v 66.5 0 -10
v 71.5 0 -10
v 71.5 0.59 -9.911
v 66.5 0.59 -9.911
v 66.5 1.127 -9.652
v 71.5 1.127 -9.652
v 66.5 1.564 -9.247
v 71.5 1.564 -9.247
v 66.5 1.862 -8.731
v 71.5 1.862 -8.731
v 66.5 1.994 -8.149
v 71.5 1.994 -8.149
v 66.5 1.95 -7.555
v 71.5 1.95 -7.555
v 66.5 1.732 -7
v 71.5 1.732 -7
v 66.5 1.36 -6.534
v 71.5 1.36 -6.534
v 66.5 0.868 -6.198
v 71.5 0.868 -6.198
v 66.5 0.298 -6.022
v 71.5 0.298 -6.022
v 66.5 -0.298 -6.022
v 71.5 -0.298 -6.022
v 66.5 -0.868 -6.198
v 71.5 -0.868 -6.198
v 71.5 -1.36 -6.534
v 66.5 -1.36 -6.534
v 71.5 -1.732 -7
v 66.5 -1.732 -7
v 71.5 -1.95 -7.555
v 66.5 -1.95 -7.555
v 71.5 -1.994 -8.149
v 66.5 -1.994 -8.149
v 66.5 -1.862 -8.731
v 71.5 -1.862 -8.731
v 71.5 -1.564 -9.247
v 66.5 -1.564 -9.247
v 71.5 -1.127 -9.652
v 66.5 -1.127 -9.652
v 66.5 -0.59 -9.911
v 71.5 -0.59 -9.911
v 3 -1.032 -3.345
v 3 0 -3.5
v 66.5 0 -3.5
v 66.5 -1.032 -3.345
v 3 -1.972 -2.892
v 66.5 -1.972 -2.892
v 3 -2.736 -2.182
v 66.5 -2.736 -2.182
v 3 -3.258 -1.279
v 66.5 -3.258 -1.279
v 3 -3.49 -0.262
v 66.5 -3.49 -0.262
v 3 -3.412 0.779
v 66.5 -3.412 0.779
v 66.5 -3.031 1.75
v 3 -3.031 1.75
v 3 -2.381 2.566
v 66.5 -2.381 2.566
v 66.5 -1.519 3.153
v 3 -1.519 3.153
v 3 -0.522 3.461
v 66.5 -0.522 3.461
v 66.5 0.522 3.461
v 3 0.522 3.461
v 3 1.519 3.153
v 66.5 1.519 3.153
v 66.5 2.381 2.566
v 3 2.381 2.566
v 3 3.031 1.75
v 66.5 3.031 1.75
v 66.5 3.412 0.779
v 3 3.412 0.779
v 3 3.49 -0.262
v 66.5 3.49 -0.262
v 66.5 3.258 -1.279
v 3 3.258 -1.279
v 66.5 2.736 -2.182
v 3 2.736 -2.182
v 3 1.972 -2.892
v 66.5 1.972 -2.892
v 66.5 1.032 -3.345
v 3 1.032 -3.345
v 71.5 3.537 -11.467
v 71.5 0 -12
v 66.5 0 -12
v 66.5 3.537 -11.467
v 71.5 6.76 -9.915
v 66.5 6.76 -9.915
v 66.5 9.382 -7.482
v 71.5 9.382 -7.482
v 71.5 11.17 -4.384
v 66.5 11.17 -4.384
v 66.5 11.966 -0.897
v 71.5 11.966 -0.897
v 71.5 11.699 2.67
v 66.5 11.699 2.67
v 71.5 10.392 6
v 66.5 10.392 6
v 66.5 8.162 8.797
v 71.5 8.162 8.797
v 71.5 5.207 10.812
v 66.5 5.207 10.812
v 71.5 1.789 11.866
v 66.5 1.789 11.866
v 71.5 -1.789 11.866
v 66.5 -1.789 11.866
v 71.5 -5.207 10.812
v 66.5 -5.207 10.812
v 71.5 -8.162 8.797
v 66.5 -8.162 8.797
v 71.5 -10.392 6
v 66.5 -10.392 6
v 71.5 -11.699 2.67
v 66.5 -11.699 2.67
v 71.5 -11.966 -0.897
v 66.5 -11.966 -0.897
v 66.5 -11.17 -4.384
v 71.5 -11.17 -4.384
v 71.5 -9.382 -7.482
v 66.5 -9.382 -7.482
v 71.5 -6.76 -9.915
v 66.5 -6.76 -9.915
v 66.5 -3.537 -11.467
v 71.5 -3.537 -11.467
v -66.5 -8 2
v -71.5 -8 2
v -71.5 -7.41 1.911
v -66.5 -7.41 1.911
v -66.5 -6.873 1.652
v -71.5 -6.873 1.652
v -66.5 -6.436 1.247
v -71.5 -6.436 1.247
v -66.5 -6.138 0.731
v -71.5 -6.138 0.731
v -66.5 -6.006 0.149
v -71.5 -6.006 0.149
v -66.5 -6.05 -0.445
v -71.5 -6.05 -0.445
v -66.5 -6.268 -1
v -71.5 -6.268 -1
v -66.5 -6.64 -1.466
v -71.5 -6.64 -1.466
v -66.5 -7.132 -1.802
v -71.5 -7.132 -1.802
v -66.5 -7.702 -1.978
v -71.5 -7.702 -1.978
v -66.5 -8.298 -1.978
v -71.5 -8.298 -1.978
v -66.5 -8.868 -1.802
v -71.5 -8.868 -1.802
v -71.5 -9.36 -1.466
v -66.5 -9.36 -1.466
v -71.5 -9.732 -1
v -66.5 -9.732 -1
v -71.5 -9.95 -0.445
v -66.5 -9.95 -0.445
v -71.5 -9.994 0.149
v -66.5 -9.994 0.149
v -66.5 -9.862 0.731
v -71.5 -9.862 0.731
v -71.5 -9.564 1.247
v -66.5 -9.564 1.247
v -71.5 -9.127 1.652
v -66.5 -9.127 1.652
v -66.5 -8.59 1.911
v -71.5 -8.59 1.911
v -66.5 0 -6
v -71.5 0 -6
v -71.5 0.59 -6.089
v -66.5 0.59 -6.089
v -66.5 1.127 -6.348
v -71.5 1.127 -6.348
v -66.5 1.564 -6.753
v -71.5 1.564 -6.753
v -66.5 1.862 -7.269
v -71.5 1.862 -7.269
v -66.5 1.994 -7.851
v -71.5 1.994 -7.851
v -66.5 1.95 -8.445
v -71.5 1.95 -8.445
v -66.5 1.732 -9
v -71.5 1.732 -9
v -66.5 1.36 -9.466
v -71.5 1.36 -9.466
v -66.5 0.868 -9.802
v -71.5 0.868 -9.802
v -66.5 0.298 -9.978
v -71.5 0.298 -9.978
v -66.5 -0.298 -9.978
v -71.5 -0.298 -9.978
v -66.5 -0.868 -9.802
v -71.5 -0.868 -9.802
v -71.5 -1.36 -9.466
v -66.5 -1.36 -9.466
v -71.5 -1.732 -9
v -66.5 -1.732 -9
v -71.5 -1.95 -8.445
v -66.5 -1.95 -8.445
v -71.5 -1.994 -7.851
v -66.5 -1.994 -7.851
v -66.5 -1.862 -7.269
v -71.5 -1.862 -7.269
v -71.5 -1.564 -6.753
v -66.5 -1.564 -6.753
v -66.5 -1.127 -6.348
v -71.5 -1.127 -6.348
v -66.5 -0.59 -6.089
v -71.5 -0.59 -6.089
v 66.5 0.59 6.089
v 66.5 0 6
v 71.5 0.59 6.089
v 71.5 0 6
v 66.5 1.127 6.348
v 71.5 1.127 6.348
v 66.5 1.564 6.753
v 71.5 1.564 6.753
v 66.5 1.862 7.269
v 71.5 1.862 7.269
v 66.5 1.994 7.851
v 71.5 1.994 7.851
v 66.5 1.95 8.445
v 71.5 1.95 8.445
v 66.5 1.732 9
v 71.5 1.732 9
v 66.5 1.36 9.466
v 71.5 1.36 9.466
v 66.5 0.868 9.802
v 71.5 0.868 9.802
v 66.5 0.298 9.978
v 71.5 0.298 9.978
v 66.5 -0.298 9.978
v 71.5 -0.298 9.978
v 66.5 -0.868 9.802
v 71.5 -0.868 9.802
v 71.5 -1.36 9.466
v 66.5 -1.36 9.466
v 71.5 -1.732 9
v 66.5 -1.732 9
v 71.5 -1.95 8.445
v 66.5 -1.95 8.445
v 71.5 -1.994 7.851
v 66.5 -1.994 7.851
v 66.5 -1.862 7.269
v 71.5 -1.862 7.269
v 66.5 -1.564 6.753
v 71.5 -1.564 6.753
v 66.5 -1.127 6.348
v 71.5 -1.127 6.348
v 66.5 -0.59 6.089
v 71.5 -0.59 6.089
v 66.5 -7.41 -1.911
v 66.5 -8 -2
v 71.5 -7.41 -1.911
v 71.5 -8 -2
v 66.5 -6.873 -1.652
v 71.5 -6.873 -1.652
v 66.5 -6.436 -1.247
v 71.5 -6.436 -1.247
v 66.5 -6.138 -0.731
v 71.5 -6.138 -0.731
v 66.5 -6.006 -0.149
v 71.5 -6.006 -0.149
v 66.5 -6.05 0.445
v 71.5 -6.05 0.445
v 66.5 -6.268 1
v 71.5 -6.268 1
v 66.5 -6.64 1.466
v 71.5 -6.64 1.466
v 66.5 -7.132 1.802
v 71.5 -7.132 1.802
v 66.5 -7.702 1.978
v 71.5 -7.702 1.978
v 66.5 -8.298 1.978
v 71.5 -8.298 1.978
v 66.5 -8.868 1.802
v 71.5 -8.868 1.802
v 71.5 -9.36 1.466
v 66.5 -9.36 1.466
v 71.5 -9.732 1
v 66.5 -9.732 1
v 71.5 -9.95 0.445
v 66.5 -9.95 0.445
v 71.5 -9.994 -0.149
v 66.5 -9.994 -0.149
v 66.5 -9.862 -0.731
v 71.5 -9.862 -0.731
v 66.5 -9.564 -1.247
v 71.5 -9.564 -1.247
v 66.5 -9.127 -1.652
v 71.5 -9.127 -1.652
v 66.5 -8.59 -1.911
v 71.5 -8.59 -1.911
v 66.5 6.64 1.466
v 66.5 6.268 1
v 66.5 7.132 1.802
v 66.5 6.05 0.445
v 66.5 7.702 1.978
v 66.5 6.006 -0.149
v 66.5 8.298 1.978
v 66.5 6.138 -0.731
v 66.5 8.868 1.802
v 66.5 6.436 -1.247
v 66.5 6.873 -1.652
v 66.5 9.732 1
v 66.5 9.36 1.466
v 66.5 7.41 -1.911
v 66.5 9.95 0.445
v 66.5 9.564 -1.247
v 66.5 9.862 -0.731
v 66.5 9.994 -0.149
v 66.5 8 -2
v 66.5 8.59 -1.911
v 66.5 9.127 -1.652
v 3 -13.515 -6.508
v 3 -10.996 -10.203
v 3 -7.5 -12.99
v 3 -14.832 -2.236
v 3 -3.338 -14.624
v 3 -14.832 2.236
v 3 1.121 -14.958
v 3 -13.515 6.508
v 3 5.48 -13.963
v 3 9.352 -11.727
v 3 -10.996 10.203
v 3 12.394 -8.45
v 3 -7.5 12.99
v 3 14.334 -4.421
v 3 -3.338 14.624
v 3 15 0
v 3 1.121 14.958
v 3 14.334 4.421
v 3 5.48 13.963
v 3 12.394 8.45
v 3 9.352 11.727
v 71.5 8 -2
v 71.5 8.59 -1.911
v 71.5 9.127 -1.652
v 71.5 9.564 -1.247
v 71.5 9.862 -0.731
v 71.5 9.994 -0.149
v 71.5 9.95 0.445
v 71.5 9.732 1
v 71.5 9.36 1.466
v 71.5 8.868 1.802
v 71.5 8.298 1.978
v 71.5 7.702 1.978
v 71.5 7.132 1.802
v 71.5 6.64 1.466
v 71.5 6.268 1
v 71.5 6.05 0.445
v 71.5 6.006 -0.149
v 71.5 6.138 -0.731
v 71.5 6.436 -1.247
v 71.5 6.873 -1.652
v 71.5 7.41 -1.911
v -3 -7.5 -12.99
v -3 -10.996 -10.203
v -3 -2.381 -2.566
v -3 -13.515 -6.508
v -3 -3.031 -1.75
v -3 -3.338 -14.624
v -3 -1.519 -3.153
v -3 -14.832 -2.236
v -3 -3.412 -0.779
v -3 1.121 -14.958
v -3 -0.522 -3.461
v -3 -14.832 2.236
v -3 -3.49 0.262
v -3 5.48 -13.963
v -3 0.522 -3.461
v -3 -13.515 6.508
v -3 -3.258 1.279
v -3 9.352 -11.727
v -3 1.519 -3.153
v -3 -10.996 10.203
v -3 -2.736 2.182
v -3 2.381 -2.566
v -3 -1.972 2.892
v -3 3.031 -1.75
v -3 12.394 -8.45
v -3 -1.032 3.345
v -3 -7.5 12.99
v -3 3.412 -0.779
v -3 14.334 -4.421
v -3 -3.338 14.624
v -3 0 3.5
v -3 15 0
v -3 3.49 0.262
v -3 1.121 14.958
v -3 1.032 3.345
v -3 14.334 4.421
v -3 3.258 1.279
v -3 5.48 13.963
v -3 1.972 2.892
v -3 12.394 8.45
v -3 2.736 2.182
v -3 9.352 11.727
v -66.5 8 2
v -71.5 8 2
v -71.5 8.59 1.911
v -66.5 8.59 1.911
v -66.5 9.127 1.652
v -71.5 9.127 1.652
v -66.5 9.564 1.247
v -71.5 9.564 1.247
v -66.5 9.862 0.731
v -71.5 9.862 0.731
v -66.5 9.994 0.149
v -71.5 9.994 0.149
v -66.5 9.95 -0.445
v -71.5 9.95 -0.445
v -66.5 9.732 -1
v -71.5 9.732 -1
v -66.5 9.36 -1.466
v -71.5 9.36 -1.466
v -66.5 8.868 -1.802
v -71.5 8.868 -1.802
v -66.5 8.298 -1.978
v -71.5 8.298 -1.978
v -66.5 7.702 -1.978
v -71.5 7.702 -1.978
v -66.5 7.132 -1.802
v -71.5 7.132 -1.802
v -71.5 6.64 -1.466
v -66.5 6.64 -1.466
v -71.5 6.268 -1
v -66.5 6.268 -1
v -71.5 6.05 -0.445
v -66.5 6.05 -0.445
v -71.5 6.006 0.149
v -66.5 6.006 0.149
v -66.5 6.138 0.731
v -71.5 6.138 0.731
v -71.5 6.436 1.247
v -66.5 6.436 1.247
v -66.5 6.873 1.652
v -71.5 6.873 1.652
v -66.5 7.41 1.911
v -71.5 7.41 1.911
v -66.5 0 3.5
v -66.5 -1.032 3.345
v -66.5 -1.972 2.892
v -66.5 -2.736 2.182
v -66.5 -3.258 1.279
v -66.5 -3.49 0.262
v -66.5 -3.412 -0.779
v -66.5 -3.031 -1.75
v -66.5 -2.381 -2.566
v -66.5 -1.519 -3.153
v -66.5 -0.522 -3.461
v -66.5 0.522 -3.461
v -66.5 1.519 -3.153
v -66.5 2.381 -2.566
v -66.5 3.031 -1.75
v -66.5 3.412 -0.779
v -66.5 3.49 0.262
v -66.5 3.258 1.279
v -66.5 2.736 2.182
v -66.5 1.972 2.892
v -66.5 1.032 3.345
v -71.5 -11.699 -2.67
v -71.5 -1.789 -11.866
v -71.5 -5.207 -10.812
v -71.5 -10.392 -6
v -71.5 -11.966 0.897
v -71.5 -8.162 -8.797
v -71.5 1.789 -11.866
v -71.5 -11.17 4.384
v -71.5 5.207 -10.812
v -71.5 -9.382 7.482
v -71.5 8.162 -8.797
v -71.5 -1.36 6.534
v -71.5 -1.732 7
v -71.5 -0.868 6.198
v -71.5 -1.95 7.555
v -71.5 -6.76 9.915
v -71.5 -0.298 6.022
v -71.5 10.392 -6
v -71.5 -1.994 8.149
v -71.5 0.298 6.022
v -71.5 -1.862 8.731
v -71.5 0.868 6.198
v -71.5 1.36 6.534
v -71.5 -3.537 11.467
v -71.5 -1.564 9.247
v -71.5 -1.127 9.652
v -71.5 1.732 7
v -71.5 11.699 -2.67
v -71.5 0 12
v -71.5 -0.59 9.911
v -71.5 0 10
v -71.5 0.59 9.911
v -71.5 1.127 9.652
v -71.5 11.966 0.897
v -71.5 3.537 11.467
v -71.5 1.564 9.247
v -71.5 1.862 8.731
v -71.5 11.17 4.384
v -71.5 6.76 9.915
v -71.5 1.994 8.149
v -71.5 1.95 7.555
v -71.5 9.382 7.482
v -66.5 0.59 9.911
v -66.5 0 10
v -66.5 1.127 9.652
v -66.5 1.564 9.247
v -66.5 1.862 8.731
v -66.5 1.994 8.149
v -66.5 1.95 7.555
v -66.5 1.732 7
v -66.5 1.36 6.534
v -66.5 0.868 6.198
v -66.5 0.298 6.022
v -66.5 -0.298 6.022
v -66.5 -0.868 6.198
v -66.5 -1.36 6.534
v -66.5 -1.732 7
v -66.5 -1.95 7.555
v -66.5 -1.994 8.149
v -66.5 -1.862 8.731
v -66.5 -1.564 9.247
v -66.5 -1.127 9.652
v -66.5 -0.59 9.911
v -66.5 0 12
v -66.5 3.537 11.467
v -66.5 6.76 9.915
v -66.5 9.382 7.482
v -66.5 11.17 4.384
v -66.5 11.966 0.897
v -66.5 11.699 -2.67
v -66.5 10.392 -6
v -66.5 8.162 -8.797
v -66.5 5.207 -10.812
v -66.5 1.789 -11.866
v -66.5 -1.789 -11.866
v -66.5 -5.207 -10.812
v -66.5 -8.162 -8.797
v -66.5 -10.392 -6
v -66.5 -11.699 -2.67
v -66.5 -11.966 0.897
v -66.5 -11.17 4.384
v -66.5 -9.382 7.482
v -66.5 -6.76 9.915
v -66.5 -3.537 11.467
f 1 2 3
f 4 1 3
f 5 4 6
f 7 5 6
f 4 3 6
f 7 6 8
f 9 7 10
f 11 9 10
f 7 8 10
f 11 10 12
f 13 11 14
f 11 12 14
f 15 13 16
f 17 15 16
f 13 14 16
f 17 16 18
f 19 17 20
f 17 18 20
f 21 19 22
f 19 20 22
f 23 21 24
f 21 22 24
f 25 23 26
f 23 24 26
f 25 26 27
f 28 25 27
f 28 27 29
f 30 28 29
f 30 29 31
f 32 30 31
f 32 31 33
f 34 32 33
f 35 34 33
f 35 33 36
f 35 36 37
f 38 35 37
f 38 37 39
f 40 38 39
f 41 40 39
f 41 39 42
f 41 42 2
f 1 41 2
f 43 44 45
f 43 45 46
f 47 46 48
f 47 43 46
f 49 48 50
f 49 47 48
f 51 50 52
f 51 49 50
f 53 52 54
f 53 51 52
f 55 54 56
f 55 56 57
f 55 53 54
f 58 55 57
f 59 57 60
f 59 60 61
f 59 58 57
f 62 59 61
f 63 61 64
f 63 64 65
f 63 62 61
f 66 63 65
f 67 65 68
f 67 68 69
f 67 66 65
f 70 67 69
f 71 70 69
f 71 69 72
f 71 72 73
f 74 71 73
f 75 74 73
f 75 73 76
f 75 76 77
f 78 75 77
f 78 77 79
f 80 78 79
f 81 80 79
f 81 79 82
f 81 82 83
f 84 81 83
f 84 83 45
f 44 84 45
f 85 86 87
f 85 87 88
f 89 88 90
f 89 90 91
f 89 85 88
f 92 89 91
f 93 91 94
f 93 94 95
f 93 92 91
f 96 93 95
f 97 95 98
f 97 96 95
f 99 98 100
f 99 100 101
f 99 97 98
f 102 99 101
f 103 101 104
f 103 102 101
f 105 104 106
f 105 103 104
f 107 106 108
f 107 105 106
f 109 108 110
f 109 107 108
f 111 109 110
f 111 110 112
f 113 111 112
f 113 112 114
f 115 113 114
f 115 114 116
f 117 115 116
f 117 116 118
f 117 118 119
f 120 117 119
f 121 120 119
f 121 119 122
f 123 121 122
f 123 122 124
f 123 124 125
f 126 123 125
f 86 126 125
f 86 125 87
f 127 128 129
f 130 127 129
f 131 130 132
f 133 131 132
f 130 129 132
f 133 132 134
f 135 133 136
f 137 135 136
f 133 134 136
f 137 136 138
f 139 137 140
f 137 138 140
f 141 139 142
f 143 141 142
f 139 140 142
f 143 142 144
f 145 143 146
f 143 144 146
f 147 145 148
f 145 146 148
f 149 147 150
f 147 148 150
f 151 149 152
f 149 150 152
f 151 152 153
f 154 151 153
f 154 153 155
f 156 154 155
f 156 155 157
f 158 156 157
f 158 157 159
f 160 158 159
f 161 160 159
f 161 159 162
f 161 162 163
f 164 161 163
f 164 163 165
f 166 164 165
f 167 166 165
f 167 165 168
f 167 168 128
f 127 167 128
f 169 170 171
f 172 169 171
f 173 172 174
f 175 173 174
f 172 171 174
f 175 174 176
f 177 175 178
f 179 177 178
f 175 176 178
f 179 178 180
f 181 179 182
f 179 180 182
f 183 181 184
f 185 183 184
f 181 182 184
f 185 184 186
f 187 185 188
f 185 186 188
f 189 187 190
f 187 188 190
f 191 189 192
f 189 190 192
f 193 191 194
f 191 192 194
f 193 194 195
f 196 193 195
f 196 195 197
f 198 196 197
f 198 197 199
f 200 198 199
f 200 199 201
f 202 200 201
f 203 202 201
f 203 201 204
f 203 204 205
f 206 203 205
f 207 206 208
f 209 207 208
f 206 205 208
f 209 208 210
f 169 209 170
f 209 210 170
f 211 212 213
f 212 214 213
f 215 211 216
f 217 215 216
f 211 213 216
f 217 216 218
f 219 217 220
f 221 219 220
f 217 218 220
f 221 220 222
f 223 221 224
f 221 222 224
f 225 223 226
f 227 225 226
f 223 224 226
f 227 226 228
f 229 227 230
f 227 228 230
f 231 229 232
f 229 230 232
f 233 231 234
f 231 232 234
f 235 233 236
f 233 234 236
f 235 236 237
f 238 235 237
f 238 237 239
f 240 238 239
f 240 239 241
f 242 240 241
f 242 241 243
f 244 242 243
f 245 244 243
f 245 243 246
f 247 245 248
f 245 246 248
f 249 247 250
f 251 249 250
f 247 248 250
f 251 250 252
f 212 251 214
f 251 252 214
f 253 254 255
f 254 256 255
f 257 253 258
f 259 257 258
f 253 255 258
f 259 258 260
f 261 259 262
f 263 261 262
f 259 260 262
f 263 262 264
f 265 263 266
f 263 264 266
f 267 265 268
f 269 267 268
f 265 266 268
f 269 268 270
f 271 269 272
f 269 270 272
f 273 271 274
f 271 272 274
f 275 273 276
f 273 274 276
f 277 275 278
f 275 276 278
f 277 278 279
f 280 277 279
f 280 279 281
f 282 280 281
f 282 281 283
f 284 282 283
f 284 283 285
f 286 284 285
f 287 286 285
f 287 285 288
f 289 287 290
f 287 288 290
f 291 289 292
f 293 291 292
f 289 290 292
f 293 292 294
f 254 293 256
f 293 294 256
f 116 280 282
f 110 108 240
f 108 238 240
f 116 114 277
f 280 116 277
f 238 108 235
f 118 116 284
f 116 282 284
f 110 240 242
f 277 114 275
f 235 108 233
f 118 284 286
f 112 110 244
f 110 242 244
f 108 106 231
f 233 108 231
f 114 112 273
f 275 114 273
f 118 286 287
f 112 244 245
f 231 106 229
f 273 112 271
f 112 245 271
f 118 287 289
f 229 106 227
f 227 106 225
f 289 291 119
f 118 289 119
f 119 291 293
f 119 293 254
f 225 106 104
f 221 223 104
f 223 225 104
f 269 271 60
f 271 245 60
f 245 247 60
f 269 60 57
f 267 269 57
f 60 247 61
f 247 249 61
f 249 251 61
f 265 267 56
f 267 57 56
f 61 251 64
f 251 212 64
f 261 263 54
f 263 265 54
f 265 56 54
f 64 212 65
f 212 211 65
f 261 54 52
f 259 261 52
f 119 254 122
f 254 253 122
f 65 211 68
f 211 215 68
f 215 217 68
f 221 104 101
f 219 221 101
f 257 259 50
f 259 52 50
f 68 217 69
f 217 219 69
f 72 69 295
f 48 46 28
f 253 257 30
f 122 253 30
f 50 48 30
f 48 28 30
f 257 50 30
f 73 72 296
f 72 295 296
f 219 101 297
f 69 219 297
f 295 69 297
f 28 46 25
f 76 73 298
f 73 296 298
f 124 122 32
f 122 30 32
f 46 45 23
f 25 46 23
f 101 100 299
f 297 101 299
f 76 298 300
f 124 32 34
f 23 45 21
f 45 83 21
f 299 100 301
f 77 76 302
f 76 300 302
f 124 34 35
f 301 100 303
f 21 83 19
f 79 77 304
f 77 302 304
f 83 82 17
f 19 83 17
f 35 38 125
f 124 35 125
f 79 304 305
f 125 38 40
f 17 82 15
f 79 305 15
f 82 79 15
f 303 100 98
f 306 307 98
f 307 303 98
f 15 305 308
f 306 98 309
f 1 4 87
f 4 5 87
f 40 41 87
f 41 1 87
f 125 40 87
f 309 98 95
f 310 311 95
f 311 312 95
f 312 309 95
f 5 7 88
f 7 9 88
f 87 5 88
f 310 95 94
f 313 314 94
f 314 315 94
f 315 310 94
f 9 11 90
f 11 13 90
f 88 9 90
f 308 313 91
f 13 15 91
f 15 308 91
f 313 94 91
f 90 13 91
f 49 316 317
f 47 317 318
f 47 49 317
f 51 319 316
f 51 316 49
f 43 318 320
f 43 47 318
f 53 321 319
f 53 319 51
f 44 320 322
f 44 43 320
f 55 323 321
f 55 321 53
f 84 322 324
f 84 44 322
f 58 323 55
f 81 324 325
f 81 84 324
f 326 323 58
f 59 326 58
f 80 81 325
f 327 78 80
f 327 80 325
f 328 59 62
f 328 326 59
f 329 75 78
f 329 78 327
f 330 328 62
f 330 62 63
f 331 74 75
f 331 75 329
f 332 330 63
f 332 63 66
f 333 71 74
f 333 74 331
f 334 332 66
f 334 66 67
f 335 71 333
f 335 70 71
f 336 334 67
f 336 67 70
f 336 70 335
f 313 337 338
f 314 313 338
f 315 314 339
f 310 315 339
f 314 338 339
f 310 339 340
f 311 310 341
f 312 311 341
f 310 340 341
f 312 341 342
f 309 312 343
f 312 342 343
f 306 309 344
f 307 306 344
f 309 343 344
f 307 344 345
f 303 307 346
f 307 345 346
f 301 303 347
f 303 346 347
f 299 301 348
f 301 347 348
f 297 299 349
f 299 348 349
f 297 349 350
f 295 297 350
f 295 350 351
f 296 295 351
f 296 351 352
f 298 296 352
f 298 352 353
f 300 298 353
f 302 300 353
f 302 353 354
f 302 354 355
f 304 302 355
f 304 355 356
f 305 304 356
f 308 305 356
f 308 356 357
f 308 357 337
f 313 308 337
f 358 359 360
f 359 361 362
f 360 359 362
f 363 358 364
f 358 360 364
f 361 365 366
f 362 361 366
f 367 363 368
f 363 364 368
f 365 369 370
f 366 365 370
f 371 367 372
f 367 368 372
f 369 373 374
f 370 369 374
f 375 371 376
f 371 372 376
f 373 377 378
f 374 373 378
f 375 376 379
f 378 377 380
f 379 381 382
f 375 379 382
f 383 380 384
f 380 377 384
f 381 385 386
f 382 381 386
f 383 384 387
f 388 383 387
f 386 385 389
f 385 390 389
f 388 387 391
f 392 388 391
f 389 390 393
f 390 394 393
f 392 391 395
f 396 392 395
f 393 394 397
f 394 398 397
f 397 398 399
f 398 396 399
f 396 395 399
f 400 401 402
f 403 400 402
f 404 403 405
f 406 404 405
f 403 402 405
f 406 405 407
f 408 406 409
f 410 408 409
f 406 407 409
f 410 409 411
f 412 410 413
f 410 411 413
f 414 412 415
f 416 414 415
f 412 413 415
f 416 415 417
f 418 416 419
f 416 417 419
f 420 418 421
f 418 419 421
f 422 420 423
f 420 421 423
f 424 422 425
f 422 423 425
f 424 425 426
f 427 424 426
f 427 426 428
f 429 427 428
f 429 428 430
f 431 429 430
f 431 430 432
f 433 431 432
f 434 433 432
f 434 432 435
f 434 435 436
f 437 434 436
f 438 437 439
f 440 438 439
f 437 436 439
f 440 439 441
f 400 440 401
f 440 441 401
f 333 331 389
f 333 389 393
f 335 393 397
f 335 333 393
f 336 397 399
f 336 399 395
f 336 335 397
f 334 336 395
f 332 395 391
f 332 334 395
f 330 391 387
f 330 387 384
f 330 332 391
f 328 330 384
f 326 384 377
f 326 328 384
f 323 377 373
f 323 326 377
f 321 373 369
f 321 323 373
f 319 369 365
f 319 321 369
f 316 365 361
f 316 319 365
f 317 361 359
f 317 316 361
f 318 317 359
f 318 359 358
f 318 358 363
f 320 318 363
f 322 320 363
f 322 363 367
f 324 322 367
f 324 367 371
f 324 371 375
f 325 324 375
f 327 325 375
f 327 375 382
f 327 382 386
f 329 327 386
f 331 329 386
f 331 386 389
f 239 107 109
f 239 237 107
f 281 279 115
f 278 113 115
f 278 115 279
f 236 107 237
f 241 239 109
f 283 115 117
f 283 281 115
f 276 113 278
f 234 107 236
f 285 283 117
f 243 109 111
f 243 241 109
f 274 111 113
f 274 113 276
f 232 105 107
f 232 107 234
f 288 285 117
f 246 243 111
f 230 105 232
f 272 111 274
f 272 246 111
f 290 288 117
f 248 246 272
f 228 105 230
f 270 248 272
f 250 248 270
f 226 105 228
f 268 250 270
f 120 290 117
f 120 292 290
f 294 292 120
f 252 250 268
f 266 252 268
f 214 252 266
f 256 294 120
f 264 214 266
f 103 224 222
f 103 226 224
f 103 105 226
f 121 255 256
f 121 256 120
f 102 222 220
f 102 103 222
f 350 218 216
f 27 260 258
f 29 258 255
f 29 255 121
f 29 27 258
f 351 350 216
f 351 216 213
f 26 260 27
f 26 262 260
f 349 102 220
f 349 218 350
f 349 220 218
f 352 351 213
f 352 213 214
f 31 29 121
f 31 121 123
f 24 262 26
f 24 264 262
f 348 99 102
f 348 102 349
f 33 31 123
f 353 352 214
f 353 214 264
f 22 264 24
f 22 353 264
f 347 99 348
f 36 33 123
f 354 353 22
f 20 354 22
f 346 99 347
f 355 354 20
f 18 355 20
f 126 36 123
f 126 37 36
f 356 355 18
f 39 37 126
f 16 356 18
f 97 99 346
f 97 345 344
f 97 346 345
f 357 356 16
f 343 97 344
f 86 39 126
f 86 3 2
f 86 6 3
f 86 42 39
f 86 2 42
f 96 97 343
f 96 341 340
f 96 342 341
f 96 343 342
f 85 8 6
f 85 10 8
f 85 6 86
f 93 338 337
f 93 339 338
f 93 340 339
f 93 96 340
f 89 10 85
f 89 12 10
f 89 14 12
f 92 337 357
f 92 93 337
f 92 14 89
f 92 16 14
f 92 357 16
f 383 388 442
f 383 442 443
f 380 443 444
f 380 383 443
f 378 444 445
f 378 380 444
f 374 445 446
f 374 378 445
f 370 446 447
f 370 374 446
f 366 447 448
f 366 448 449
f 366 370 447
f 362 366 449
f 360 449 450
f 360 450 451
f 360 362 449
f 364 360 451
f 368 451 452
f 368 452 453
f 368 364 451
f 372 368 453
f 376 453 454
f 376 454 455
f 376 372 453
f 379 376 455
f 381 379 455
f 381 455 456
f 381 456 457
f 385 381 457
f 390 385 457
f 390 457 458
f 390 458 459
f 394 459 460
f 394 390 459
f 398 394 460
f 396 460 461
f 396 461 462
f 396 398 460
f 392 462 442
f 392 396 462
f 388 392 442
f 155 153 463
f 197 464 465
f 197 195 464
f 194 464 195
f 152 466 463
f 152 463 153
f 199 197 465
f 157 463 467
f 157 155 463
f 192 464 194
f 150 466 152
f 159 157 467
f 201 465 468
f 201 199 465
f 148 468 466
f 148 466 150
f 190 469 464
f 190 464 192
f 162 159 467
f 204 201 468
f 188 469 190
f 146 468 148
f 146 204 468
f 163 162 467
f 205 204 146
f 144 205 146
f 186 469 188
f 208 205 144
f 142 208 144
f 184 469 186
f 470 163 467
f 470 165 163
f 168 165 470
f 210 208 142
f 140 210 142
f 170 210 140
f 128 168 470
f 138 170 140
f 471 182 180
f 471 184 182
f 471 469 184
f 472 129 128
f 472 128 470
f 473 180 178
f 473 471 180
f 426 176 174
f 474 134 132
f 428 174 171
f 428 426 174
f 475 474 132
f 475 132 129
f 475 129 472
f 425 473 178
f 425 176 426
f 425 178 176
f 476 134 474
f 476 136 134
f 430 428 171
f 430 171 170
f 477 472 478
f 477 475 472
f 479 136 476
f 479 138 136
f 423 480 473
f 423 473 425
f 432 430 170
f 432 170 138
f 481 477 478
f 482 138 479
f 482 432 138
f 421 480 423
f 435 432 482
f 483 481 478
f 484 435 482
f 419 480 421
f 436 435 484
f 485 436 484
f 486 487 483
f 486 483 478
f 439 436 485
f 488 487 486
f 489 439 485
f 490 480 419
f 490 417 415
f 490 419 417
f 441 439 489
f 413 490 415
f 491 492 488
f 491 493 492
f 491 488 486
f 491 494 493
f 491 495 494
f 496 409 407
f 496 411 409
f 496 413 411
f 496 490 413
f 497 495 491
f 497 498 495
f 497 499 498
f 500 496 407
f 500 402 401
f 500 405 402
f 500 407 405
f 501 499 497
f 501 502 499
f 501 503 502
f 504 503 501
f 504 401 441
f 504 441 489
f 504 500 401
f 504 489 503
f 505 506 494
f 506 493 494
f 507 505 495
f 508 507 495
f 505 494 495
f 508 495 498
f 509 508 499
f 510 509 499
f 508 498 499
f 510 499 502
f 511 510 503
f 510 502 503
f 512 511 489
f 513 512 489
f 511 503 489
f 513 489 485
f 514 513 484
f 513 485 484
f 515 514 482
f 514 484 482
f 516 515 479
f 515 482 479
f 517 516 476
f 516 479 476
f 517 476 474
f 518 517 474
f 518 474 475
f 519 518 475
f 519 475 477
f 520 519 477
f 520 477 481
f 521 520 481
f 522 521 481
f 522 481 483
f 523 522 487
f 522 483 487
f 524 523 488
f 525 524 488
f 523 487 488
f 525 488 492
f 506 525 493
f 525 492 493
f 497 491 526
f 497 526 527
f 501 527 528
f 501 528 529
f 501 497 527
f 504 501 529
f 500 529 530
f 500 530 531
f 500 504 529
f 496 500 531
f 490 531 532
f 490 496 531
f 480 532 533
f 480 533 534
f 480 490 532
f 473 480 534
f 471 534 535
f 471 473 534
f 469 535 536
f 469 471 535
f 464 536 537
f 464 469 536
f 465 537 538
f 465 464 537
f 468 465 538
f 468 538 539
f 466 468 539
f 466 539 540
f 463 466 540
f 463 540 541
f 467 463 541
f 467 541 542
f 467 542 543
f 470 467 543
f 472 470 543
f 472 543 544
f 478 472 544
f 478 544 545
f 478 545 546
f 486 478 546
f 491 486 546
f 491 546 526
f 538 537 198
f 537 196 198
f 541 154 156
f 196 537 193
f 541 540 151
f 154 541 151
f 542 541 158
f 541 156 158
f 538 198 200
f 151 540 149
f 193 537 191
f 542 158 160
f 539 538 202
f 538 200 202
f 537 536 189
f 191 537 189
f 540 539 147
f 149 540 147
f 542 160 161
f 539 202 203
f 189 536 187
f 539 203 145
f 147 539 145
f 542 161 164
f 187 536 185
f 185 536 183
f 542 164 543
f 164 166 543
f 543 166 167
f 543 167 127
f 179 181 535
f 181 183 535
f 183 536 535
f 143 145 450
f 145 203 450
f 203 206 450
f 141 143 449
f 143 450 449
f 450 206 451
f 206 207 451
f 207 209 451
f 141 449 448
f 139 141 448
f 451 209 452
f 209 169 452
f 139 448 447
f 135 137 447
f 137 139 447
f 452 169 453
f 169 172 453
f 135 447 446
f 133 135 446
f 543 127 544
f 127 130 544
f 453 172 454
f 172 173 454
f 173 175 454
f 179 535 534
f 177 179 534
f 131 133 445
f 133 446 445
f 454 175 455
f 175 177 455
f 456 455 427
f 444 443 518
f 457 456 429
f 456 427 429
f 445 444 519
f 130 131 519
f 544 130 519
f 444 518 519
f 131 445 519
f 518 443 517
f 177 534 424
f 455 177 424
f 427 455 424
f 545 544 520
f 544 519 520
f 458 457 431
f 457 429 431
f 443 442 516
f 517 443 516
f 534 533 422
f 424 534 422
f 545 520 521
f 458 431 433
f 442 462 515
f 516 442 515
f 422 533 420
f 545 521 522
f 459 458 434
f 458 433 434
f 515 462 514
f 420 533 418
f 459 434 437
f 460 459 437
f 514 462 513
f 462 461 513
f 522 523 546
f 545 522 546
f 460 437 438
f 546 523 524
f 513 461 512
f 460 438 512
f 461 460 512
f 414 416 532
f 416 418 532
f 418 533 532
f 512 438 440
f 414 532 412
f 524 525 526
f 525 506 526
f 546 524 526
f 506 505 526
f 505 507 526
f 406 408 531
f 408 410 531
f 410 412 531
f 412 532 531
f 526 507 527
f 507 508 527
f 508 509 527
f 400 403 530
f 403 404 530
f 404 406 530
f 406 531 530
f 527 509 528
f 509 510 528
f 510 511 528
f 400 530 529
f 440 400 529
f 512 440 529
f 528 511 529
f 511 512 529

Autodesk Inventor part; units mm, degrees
ref_plane "YZ Plane" through (0, 0, 0) normal (1, 0, 0) x (0, 1, 0)
ref_plane "XZ Plane" through (0, 0, 0) normal (0, 1, 0) x (-1, 0, 0)
ref_plane "XY Plane" through (0, 0, 0) normal (0, 0, 1) x (1, 0, 0)
sketch "草圖1" plane through (0, 0, 0) normal (1, 0, 0) x (0, 1, 0)
  circle A0 centre (0, 0) radius 15
  dimension "d0" = 30
extrude "擠出1" add sketch "草圖1" along normal mid plane 6
sketch "草圖2" plane through (3, 0, 0) normal (1, 0, 0) x (0, 0, -1)
  circle A0 centre (0, 0) radius 3.5
  dimension "d3" = 7
extrude "擠出2" add sketch "草圖2" along normal blind 68.5
sketch "草圖3" plane through (-3, 0, 0) normal (-1, 0, 0) x (0, 0, 1)
  circle A0 centre (0, 0) radius 3.5
  dimension "d6" = 7
extrude "擠出3" add sketch "草圖3" along normal blind 68.5
sketch "草圖9" plane through (-71.5, 0, 0) normal (-1, 0, 0) x (0, 0, 1)
  circle A0 centre (0, 0) radius 12
  dimension "d27" = 24
extrude "擠出8" add sketch "草圖9" against normal blind 5
sketch "草圖11" plane through (71.5, 0, 0) normal (1, 0, 0) x (0, 0, -1)
  circle A0 centre (0, 0) radius 12
  dimension "d30" = 24
extrude "擠出9" add sketch "草圖11" against normal blind 5
sketch "草圖12" plane through (71.5, 0, 0) normal (1, 0, 0) x (0, 0, -1)
  circle A0 centre (0, -8) radius 2
  circle A1 centre (8, 0) radius 2
  circle A2 centre (0, 8) radius 2
  circle A3 centre (-8, 0) radius 2
  point P0 (0, 0)
  dimension "d33" = 4
  dimension "d36" = 360
extrude "擠出10" cut sketch "草圖12" against normal blind 5
sketch "草圖13" plane through (-71.5, 0, 0) normal (-1, 0, 0) x (0, 0, 1)
  circle A0 centre (0, -8) radius 2
  circle A1 centre (8, 0) radius 2
  circle A2 centre (0, 8) radius 2
  circle A3 centre (-8, 0) radius 2
  point P0 (0, 0)
  dimension "d40" = 4
  dimension "d43" = 360
extrude "擠出11" cut sketch "草圖13" against normal blind 5
properties part number "煞車桿"
